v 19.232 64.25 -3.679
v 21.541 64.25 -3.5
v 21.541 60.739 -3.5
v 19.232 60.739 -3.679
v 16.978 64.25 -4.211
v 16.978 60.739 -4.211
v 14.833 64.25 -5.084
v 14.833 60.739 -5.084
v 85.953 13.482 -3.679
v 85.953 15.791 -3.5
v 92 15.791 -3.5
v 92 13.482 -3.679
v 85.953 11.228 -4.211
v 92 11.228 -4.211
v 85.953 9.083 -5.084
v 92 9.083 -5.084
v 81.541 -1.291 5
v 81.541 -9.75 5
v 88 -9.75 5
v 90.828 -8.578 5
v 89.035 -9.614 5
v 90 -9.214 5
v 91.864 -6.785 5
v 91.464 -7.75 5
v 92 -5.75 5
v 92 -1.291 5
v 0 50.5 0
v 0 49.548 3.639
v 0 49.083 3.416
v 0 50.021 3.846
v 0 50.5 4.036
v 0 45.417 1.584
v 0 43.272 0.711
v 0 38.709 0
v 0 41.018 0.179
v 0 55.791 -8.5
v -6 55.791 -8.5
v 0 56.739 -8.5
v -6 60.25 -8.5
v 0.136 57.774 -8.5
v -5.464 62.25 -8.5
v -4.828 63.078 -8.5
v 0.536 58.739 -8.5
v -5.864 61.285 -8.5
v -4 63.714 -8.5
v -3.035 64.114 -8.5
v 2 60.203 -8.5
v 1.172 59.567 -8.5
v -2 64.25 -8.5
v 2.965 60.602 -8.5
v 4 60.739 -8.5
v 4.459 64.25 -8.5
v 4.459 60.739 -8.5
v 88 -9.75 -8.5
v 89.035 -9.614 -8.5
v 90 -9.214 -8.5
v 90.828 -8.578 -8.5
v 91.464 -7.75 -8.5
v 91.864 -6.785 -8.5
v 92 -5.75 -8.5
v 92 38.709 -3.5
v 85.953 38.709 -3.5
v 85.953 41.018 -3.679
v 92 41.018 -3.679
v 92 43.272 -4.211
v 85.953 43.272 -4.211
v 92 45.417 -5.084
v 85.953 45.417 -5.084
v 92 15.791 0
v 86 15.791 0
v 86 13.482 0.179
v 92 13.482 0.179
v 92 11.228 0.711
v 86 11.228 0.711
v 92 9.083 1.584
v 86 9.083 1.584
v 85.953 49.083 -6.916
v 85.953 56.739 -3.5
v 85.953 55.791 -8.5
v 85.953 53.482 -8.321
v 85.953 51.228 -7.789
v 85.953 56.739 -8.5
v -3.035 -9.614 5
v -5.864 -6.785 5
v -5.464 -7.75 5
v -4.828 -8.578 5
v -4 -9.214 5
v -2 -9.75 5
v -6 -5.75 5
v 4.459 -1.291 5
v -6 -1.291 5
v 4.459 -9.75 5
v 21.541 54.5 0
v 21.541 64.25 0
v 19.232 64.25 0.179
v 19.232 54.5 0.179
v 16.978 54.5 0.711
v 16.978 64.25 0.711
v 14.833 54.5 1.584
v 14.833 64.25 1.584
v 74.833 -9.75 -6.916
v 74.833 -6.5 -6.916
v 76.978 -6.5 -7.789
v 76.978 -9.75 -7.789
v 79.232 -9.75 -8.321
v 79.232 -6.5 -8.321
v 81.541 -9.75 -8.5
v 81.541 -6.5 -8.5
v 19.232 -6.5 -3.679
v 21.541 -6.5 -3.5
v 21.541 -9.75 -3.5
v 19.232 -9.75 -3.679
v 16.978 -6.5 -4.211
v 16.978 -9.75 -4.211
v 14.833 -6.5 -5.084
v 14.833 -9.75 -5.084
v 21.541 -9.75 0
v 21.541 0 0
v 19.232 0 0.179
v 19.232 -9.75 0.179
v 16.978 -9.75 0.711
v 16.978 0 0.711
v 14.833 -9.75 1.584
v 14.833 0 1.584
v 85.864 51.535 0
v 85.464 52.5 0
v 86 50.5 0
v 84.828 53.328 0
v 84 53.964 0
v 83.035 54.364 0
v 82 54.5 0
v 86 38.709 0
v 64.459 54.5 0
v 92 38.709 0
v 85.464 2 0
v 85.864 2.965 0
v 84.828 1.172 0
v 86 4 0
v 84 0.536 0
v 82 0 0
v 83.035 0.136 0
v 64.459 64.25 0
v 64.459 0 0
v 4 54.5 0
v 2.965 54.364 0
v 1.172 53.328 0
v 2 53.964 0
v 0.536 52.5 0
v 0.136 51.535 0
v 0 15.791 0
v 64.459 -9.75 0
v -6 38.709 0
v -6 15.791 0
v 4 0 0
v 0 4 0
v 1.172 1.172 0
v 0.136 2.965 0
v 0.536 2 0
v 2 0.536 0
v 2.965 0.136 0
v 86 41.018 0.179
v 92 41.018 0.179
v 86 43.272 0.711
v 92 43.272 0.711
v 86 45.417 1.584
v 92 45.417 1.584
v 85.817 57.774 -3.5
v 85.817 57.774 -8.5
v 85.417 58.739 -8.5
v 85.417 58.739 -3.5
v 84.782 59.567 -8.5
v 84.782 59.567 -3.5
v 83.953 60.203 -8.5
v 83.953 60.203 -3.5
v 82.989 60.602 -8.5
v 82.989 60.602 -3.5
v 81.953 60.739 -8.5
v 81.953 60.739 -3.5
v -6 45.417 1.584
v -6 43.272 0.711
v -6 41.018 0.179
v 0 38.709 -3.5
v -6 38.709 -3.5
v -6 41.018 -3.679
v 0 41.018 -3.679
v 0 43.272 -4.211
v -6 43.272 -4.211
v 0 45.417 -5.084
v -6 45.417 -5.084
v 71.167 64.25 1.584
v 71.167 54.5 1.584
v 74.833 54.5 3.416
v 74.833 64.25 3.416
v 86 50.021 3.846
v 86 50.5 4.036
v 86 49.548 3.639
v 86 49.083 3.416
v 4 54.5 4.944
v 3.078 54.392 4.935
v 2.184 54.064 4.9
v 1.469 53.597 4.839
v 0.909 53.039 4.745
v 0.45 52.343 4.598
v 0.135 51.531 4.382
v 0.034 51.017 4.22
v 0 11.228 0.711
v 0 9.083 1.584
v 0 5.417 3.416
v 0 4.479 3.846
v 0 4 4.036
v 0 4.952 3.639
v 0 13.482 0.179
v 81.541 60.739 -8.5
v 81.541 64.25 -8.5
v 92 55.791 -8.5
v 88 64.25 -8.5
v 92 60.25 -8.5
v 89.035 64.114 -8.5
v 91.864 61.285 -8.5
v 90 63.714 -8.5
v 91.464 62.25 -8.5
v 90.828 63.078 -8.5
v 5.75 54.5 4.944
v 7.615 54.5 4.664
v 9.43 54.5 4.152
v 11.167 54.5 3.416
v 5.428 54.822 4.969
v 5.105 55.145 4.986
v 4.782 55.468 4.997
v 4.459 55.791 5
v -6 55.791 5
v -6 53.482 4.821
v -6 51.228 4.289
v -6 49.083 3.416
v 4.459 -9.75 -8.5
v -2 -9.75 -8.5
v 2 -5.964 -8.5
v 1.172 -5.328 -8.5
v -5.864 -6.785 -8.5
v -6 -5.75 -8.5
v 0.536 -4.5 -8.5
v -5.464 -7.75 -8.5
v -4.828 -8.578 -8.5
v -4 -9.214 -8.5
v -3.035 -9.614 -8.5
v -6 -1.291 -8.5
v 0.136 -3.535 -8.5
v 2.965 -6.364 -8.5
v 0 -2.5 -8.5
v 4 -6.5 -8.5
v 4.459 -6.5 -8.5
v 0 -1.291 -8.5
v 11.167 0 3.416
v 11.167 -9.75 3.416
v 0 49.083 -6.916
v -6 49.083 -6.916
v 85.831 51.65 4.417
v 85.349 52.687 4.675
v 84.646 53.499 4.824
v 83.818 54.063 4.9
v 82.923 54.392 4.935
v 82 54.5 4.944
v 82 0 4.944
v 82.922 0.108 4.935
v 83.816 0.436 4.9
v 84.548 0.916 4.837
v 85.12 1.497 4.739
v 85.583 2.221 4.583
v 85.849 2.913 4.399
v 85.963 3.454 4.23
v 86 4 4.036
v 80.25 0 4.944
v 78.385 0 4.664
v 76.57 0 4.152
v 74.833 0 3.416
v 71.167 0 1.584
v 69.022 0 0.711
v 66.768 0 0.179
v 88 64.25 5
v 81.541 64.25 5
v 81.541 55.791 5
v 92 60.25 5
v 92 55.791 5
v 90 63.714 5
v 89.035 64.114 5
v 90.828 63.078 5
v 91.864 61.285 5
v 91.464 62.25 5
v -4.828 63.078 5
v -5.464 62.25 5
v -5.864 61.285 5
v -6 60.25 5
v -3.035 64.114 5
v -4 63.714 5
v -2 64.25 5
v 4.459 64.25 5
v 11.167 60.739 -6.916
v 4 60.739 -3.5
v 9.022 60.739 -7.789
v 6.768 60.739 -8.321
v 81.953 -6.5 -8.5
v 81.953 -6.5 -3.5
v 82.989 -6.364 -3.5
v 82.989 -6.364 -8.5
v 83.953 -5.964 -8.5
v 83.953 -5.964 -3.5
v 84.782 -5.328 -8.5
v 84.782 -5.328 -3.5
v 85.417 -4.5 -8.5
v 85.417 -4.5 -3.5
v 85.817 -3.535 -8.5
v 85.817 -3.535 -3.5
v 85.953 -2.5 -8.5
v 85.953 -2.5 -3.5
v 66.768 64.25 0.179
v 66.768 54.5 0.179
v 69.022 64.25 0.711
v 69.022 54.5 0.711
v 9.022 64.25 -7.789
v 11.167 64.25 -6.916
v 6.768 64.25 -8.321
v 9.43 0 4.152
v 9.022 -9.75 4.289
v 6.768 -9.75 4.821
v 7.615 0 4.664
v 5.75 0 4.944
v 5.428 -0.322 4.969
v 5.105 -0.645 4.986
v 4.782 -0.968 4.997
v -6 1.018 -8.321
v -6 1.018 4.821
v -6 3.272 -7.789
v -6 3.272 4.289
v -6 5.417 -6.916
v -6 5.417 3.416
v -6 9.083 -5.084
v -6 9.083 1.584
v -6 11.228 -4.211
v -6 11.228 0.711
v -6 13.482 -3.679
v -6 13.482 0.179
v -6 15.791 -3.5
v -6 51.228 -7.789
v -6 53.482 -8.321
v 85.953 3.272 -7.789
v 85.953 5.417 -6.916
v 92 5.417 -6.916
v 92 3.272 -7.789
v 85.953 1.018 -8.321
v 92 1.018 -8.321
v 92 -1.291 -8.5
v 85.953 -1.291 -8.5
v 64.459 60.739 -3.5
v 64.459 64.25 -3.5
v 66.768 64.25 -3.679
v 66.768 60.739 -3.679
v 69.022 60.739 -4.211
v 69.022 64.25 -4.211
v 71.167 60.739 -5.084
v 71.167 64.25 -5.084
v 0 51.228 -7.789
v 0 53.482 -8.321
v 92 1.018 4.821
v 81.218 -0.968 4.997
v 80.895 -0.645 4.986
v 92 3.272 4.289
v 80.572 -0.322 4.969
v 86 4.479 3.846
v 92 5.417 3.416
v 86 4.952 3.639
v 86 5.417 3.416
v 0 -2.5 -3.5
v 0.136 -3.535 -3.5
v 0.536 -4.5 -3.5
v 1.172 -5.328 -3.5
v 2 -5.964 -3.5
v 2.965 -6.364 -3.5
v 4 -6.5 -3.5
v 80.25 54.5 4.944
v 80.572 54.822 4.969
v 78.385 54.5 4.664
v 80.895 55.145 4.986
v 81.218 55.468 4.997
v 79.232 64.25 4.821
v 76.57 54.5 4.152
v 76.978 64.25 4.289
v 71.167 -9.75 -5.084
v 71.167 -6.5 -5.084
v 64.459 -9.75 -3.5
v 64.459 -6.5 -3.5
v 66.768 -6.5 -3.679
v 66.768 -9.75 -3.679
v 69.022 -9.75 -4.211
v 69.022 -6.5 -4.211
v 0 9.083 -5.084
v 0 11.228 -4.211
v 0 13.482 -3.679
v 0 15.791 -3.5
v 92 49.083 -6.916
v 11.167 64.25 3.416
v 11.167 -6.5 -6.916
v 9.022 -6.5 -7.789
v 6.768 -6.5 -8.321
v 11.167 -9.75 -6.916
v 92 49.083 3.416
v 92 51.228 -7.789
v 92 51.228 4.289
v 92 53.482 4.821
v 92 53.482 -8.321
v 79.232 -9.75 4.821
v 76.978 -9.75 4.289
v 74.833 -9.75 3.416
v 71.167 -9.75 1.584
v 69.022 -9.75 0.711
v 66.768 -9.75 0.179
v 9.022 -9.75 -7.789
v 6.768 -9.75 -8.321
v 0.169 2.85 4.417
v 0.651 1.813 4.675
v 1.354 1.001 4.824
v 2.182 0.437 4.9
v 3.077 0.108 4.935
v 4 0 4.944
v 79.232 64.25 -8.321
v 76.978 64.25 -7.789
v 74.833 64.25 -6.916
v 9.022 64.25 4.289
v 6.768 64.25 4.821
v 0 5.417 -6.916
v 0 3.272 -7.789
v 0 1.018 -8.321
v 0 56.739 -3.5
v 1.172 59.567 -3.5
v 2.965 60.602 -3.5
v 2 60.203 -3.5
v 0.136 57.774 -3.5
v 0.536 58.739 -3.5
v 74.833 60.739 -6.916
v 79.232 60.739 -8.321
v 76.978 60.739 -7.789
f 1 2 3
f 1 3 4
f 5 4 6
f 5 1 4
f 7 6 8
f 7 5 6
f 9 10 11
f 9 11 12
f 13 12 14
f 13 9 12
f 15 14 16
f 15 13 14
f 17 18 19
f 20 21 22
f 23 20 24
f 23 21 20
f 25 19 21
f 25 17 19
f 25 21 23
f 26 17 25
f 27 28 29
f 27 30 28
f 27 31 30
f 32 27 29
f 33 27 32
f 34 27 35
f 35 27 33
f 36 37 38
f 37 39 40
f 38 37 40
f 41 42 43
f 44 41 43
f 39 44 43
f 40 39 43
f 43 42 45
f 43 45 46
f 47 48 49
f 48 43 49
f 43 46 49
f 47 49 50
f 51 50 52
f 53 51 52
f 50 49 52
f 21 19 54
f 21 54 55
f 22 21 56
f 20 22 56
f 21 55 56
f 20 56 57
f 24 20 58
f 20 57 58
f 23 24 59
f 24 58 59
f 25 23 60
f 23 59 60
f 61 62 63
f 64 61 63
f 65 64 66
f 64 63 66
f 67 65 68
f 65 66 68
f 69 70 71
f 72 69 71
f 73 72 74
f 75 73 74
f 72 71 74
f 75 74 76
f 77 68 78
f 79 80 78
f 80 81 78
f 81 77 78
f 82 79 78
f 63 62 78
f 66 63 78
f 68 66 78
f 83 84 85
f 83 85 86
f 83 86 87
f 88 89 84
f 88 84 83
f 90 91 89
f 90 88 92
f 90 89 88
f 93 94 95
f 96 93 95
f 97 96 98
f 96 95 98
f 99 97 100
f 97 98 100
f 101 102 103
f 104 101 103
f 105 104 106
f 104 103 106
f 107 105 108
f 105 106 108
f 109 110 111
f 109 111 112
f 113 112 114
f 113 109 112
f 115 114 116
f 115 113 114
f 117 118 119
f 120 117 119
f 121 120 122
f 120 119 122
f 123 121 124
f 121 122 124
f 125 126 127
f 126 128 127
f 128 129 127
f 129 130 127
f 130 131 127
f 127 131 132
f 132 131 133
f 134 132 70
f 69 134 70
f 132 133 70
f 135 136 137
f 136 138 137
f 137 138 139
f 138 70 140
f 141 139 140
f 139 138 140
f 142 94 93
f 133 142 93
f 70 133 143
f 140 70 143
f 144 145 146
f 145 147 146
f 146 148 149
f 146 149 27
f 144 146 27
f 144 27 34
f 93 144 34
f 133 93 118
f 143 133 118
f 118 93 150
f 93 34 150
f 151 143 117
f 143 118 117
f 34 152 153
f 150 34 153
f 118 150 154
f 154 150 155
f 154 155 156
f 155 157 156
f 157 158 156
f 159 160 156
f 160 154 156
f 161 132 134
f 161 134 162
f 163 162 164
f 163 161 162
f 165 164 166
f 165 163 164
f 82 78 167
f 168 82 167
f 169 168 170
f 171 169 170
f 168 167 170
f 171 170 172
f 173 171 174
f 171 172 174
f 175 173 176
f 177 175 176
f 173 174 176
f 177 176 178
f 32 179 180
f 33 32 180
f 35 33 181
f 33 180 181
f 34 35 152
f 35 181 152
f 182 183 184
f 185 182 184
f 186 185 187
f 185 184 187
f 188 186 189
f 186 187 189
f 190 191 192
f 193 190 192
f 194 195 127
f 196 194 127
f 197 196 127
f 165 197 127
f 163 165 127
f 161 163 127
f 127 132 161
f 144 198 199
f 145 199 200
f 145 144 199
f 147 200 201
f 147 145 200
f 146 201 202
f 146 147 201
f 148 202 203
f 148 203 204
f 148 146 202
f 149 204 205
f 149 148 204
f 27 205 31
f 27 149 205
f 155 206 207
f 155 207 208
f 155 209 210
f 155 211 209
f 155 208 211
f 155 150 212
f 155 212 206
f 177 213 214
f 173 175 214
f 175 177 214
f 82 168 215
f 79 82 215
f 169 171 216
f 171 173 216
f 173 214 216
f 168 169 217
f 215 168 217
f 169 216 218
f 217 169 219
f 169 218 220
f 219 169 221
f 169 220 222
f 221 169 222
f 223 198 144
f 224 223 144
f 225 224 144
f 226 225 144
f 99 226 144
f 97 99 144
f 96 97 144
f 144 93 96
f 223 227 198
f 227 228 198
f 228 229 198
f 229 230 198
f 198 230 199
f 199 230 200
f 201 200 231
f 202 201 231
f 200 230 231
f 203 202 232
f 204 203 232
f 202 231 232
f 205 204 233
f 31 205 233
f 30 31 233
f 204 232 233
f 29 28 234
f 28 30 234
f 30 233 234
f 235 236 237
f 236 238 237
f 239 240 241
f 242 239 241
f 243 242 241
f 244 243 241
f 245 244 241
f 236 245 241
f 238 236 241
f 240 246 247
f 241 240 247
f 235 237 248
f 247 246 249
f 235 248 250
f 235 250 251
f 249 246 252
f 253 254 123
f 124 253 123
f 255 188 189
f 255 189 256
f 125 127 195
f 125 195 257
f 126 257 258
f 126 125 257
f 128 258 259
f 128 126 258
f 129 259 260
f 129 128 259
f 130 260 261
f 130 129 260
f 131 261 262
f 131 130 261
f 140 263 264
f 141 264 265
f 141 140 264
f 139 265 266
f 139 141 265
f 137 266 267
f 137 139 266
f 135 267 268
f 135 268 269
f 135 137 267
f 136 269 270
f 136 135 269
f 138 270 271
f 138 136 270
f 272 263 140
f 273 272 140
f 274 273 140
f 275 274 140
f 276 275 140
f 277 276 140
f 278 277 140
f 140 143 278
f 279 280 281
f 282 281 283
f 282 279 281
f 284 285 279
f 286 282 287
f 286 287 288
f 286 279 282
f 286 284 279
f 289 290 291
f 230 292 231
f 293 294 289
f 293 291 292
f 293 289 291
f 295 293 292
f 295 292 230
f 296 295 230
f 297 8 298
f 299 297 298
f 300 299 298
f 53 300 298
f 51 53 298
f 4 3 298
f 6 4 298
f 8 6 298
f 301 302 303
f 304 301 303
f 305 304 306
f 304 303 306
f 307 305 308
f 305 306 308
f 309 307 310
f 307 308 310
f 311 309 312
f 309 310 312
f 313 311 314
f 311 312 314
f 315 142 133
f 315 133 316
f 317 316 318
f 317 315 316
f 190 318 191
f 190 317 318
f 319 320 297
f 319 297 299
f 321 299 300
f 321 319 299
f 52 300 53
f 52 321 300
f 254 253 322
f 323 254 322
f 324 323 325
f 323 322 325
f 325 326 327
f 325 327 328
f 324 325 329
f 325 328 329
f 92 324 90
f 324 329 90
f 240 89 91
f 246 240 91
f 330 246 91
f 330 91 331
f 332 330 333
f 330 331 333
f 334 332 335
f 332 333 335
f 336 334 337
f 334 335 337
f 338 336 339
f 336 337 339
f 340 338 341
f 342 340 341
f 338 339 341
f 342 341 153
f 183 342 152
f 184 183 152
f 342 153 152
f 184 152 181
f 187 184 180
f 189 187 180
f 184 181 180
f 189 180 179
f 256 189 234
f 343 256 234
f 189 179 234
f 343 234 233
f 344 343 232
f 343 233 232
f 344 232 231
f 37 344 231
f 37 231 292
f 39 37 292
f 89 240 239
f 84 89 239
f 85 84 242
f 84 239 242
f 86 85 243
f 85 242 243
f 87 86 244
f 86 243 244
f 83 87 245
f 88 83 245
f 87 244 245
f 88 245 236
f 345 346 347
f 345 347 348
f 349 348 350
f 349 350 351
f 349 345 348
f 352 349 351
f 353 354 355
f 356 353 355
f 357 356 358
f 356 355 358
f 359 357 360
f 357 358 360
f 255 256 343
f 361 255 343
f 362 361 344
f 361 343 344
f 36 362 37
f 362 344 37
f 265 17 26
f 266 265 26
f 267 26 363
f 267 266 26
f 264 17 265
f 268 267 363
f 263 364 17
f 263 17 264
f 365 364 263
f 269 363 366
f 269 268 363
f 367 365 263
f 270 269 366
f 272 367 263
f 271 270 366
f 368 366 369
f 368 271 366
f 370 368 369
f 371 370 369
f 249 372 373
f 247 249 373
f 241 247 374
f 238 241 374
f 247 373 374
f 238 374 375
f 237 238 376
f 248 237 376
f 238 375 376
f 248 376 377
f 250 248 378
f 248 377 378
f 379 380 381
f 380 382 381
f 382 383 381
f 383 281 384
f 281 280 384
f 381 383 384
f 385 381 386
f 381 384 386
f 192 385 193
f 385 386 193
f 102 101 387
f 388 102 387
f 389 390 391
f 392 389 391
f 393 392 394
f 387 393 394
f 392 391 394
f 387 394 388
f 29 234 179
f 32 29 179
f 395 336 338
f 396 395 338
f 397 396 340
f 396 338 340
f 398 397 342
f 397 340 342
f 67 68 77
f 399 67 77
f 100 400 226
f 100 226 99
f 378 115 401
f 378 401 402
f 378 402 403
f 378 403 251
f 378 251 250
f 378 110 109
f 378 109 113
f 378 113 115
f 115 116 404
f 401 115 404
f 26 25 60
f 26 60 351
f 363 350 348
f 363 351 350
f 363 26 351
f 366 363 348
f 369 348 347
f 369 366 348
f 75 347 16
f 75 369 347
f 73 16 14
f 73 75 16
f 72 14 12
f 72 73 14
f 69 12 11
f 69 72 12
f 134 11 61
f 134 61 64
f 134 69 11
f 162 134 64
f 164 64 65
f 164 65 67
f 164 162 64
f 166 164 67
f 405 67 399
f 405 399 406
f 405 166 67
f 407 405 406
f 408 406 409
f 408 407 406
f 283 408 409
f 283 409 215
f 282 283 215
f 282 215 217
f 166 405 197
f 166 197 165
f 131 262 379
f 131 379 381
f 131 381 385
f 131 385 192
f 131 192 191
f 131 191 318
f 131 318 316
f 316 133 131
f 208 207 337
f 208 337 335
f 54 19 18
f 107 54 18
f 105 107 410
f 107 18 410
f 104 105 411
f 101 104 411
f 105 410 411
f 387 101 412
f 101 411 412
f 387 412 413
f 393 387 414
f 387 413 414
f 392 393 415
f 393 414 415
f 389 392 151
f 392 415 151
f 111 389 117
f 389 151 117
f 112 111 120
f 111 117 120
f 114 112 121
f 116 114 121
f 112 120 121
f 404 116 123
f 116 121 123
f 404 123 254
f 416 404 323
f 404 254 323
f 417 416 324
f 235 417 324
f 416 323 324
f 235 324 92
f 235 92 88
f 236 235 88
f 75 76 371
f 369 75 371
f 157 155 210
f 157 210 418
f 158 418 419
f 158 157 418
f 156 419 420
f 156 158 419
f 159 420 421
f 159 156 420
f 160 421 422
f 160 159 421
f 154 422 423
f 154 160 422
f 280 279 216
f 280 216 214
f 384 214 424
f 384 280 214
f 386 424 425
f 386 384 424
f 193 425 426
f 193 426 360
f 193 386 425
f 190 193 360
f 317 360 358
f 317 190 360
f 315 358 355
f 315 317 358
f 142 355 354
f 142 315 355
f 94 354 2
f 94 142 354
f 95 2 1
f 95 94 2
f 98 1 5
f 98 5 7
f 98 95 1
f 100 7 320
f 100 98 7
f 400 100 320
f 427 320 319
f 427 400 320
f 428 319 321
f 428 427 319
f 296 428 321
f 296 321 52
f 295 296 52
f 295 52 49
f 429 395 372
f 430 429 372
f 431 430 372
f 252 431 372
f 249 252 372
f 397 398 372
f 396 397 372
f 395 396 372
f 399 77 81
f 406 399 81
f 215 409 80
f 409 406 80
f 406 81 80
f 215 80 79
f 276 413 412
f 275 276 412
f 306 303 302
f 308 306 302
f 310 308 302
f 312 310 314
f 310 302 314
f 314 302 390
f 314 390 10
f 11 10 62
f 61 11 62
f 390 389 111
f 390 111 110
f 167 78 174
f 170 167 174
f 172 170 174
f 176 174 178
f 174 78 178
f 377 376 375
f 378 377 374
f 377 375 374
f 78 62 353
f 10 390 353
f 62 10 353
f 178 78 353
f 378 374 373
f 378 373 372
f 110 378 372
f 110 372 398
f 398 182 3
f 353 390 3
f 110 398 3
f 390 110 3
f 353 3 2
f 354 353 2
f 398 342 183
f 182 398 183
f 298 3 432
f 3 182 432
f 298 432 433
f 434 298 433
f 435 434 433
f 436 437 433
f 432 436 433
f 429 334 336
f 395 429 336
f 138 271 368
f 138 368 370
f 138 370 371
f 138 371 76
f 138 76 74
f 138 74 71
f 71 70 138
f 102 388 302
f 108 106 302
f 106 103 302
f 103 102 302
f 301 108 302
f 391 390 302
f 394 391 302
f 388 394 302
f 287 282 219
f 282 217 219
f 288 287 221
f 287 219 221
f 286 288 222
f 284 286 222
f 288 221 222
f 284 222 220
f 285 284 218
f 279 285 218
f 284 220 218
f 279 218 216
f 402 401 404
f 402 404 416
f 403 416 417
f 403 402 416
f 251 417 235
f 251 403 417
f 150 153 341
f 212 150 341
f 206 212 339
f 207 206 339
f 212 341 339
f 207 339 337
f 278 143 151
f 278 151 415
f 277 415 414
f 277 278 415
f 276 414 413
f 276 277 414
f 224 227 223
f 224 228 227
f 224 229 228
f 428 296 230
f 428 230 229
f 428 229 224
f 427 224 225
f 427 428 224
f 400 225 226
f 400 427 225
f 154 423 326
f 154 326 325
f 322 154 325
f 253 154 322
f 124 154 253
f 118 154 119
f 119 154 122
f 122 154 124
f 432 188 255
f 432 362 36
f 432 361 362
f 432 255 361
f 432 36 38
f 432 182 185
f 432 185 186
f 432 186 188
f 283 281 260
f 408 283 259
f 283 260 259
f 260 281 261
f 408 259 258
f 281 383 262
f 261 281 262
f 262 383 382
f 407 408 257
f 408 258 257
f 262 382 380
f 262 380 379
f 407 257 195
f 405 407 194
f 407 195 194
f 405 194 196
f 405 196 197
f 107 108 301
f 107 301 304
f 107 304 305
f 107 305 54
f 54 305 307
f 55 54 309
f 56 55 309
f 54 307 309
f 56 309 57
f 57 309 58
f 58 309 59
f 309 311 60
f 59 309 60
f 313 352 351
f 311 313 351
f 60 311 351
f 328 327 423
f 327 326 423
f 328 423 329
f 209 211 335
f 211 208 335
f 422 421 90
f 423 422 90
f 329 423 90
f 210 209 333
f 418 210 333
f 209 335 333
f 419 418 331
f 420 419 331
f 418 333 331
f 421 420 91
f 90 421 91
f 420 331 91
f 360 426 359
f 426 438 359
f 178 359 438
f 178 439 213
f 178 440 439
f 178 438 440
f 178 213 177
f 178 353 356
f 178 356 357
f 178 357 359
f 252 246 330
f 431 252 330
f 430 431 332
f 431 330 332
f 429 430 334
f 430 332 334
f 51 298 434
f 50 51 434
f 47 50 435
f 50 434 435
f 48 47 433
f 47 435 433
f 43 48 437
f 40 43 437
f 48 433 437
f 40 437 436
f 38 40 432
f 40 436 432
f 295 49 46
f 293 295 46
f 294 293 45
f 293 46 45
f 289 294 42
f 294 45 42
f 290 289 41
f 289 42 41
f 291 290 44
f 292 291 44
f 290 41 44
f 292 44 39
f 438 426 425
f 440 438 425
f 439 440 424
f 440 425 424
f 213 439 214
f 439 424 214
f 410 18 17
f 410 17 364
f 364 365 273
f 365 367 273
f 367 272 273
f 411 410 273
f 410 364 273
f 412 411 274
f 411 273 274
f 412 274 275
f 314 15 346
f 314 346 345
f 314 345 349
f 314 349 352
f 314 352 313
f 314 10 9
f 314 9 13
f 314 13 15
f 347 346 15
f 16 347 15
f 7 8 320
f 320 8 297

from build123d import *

# Parameters (mm, degrees)
F2_DEPTH      = 8.5
F2_DEPTH_BACK = 5
F3_DEPTH      = 5
F5_START      = -3.5
F5_DEPTH      = 5
F7_DEPTH      = 98.001
F9_DEPTH      = 74.001
F10_T1_DEPTH  = 6.0466451645
F10_T3_DEPTH  = 6
F10_T5_DEPTH  = 3.25
F10_T7_DEPTH  = 3.5113155246
F10_T9_DEPTH  = 6
F10_T11_DEPTH = 9.75
F10_T13_DEPTH = 9.75
F10_T15_DEPTH = 23.7050983125
F10_T17_DEPTH = 23.751743477
F10_T19_DEPTH = 21.2164138371
F10_T21_DEPTH = 20.9550983125
F10_T23_DEPTH = 24.10822467
F10_T25_DEPTH = 24.10822467
F10_T27_DEPTH = 27.4550983125
F10_T29_DEPTH = 27.4550983125


# Not quite as in the source:
# - a fillet or chamfer that OpenCascade refuses, or shapes differently, is made with other operations: its cross-section is extruded or revolved along the edge and cut away or added


with BuildPart() as f2:
    # F1 (on Top) → F2 (new body, two sides)
    with BuildSketch(Plane.XY) as f2_sk:
        with BuildLine():
            ThreePointArc((-6, -5.75), (-4.8284271247, -8.5784271247), (-2, -9.75))
            Line((-2, -9.75), (88, -9.75))
            ThreePointArc((88, -9.75), (90.8284271247, -8.5784271247), (92, -5.75))
            Line((92, -5.75), (92, 60.25))
            ThreePointArc((92, 60.25), (90.8284271247, 63.0784271247), (88, 64.25))
            Line((88, 64.25), (-2, 64.25))
            ThreePointArc((-2, 64.25), (-4.8284271247, 63.0784271247), (-6, 60.25))
            Line((-6, 60.25), (-6, -5.75))
        make_face()
    extrude(amount=-F2_DEPTH)
    extrude(f2_sk.sketch, amount=F2_DEPTH_BACK)

    # F0 (on Top) → F3 (cut)
    with BuildSketch(Plane.XY):
        with BuildLine():
            ThreePointArc((0, 4), (1.1715728753, 1.1715728753), (4, 0))
            Line((4, 0), (82, 0))
            ThreePointArc((82, 0), (84.8284271247, 1.1715728753), (86, 4))
            Line((86, 4), (86, 50.5))
            ThreePointArc((86, 50.5), (84.8284271247, 53.3284271247), (82, 54.5))
            Line((82, 54.5), (4, 54.5))
            ThreePointArc((4, 54.5), (1.1715728753, 53.3284271247), (0, 50.5))
            Line((0, 50.5), (0, 4))
        make_face()
    extrude(amount=F3_DEPTH, mode=Mode.SUBTRACT)

    # F4 (on Top) → F5 (cut)
    with BuildSketch(Plane.XY.offset(F5_START)):
        with BuildLine():
            ThreePointArc((0, -2.5), (1.1715728753, -5.3284271247), (4, -6.5))
            Line((4, -6.5), (81.9533548355, -6.5))
            ThreePointArc((81.9533548355, -6.5), (84.7817819603, -5.3284271247), (85.9533548355, -2.5))
            Line((85.9533548355, -2.5), (85.9533548355, 56.7386844754))
            ThreePointArc((85.9533548355, 56.7386844754), (84.7817819603, 59.5671116002), (81.9533548355, 60.7386844754))
            Line((81.9533548355, 60.7386844754), (4, 60.7386844754))
            ThreePointArc((4, 60.7386844754), (1.1715728753, 59.5671116002), (0, 56.7386844754))
            Line((0, 56.7386844754), (0, -2.5))
        make_face()
    extrude(amount=-F5_DEPTH, mode=Mode.SUBTRACT)

    # F6 (on face) → F7 (cut, through all)
    with BuildSketch(Plane(origin=(-6, 0, 0), x_dir=(0, -1, 0), z_dir=(-1, 0, 0))):
        Polygon((-27.25, -8.5), (-2.25, -8.5), (-12.25, -3.5), (-27.25, -3.5), (-42.25, -3.5), (-52.25, -8.5), align=None)
        Polygon((-12.25, 0), (-2.25, 5), (-27.25, 5), (-52.25, 5), (-42.25, 0), (-27.25, 0), align=None)
    extrude(amount=-F7_DEPTH, mode=Mode.SUBTRACT)

    # F8 (on face) → F9 (cut, through all)
    with BuildSketch(Plane.XZ.offset(9.75)):
        Polygon((18, -3.5), (8, -8.5), (78, -8.5), (68, -3.5), (43, -3.5), align=None)
        Polygon((78, 5), (8, 5), (18, 0), (43, 0), (68, 0), align=None)
    extrude(amount=-F9_DEPTH, mode=Mode.SUBTRACT)

    # F10: fillet of radius 15 on 32 edges, made by hand

    # F10_s2 → F10_t1 (join)
    with BuildSketch(Plane.YZ.offset(85.9533548355)):
        with BuildLine():
            ThreePointArc((38.7089803375, -3.5), (42.1552741457, -3.901265158), (45.41718427, -5.083592135))
            Line((45.41718427, -5.083592135), (42.25, -3.5))
            Line((42.25, -3.5), (38.7089803375, -3.5))
        make_face()
        with BuildLine():
            ThreePointArc((15.7910196625, -3.5), (12.3447258543, -3.901265158), (9.08281573, -5.083592135))
            Line((9.08281573, -5.083592135), (12.25, -3.5))
            Line((12.25, -3.5), (15.7910196625, -3.5))
        make_face()
    extrude(amount=F10_T1_DEPTH)

    # F10_s4 → F10_t3 (join)
    with BuildSketch(Plane.YZ.offset(-6)):
        with BuildLine():
            ThreePointArc((38.7089803375, -3.5), (42.1552741457, -3.901265158), (45.41718427, -5.083592135))
            Line((45.41718427, -5.083592135), (42.25, -3.5))
            Line((42.25, -3.5), (38.7089803375, -3.5))
        make_face()
        with BuildLine():
            ThreePointArc((9.08281573, -5.083592135), (12.3447258543, -3.901265158), (15.7910196625, -3.5))
            Line((15.7910196625, -3.5), (12.25, -3.5))
            Line((12.25, -3.5), (9.08281573, -5.083592135))
        make_face()
        with BuildLine():
            ThreePointArc((15.7910196625, 0), (12.3447258543, 0.401265158), (9.08281573, 1.583592135))
            Line((9.08281573, 1.583592135), (12.25, 0))
            Line((12.25, 0), (15.7910196625, 0))
        make_face()
        with BuildLine():
            ThreePointArc((45.41718427, 1.583592135), (42.1552741457, 0.401265158), (38.7089803375, 0))
            Line((38.7089803375, 0), (42.25, 0))
            Line((42.25, 0), (45.41718427, 1.583592135))
        make_face()
    extrude(amount=F10_T3_DEPTH)

    # F10_s6 → F10_t5 (join)
    with BuildSketch(Plane.XZ.offset(6.5)):
        with BuildLine():
            ThreePointArc((64.4589803375, -3.5), (67.9052741457, -3.901265158), (71.16718427, -5.083592135))
            Line((71.16718427, -5.083592135), (68, -3.5))
            Line((68, -3.5), (64.4589803375, -3.5))
        make_face()
        with BuildLine():
            ThreePointArc((21.5410196625, -3.5), (18.0947258543, -3.901265158), (14.83281573, -5.083592135))
            Line((14.83281573, -5.083592135), (18, -3.5))
            Line((18, -3.5), (21.5410196625, -3.5))
        make_face()
    extrude(amount=F10_T5_DEPTH)

    # F10_s8 → F10_t7 (join)
    with BuildSketch(Plane.XZ.offset(-64.25)):
        with BuildLine():
            ThreePointArc((64.4589803375, -3.5), (67.9052741457, -3.901265158), (71.16718427, -5.083592135))
            Line((71.16718427, -5.083592135), (68, -3.5))
            Line((68, -3.5), (64.4589803375, -3.5))
        make_face()
        with BuildLine():
            ThreePointArc((21.5410196625, -3.5), (18.0947258543, -3.901265158), (14.83281573, -5.083592135))
            Line((14.83281573, -5.083592135), (18, -3.5))
            Line((18, -3.5), (21.5410196625, -3.5))
        make_face()
    extrude(amount=F10_T7_DEPTH)

    # F10_s10 → F10_t9 (join)
    with BuildSketch(Plane.YZ.offset(86)):
        with BuildLine():
            ThreePointArc((15.7910196625, 0), (12.3447258543, 0.401265158), (9.08281573, 1.583592135))
            Line((9.08281573, 1.583592135), (12.25, 0))
            Line((12.25, 0), (15.7910196625, 0))
        make_face()
        with BuildLine():
            ThreePointArc((38.7089803375, 0), (42.1552741457, 0.401265158), (45.41718427, 1.583592135))
            Line((45.41718427, 1.583592135), (42.25, 0))
            Line((42.25, 0), (38.7089803375, 0))
        make_face()
    extrude(amount=F10_T9_DEPTH)

    # F10_s12 → F10_t11 (join)
    with BuildSketch(Plane.XZ.offset(-64.25)):
        with BuildLine():
            ThreePointArc((64.4589803375, 0), (67.9052741457, 0.401265158), (71.16718427, 1.583592135))
            Line((71.16718427, 1.583592135), (68, 0))
            Line((68, 0), (64.4589803375, 0))
        make_face()
        with BuildLine():
            ThreePointArc((21.5410196625, 0), (18.0947258543, 0.401265158), (14.83281573, 1.583592135))
            Line((14.83281573, 1.583592135), (18, 0))
            Line((18, 0), (21.5410196625, 0))
        make_face()
    extrude(amount=F10_T11_DEPTH)

    # F10_s14 → F10_t13 (join)
    with BuildSketch(Plane.XZ):
        with BuildLine():
            ThreePointArc((64.4589803375, 0), (67.9052741457, 0.401265158), (71.16718427, 1.583592135))
            Line((71.16718427, 1.583592135), (68, 0))
            Line((68, 0), (64.4589803375, 0))
        make_face()
        with BuildLine():
            ThreePointArc((21.5410196625, 0), (18.0947258543, 0.401265158), (14.83281573, 1.583592135))
            Line((14.83281573, 1.583592135), (18, 0))
            Line((18, 0), (21.5410196625, 0))
        make_face()
    extrude(amount=F10_T13_DEPTH)

    # F10_s16 → F10_t15 (cut)
    with BuildSketch(Plane.YZ.offset(-14.8525491562)):
        with BuildLine():
            ThreePointArc((-1.2910196625, -8.5), (2.1552741457, -8.098734842), (5.41718427, -6.916407865))
            Line((5.41718427, -6.916407865), (2.25, -8.5))
            Line((2.25, -8.5), (-1.2910196625, -8.5))
        make_face()
        with BuildLine():
            ThreePointArc((49.08281573, -6.916407865), (52.3447258543, -8.098734842), (55.7910196625, -8.5))
            Line((55.7910196625, -8.5), (52.25, -8.5))
            Line((52.25, -8.5), (49.08281573, -6.916407865))
        make_face()
    extrude(amount=F10_T15_DEPTH, mode=Mode.SUBTRACT)

    # F10_s18 → F10_t17 (cut)
    with BuildSketch(Plane.YZ.offset(77.1008056793)):
        with BuildLine():
            ThreePointArc((5.41718427, -6.916407865), (2.1552741457, -8.098734842), (-1.2910196625, -8.5))
            Line((-1.2910196625, -8.5), (2.25, -8.5))
            Line((2.25, -8.5), (5.41718427, -6.916407865))
        make_face()
        with BuildLine():
            ThreePointArc((49.08281573, -6.916407865), (52.3447258543, -8.098734842), (55.7910196625, -8.5))
            Line((55.7910196625, -8.5), (52.25, -8.5))
            Line((52.25, -8.5), (49.08281573, -6.916407865))
        make_face()
    extrude(amount=F10_T17_DEPTH, mode=Mode.SUBTRACT)

    # F10_s20 → F10_t19 (cut)
    with BuildSketch(Plane.XZ.offset(-73.1025491562)):
        with BuildLine():
            ThreePointArc((74.83281573, -6.916407865), (78.0947258543, -8.098734842), (81.5410196625, -8.5))
            Line((81.5410196625, -8.5), (78, -8.5))
            Line((78, -8.5), (74.83281573, -6.916407865))
        make_face()
        with BuildLine():
            ThreePointArc((11.16718427, -6.916407865), (7.9052741457, -8.098734842), (4.4589803375, -8.5))
            Line((4.4589803375, -8.5), (8, -8.5))
            Line((8, -8.5), (11.16718427, -6.916407865))
        make_face()
    extrude(amount=F10_T19_DEPTH, mode=Mode.SUBTRACT)

    # F10_s22 → F10_t21 (cut)
    with BuildSketch(Plane.XZ.offset(-2.3525491562)):
        with BuildLine():
            ThreePointArc((74.83281573, -6.916407865), (78.0947258543, -8.098734842), (81.5410196625, -8.5))
            Line((81.5410196625, -8.5), (78, -8.5))
            Line((78, -8.5), (74.83281573, -6.916407865))
        make_face()
        with BuildLine():
            ThreePointArc((11.16718427, -6.916407865), (7.9052741457, -8.098734842), (4.4589803375, -8.5))
            Line((4.4589803375, -8.5), (8, -8.5))
            Line((8, -8.5), (11.16718427, -6.916407865))
        make_face()
    extrude(amount=F10_T21_DEPTH, mode=Mode.SUBTRACT)

    # F10_s24 → F10_t23 (cut)
    with BuildSketch(Plane.YZ.offset(-14.8525491562)):
        with BuildLine():
            ThreePointArc((5.41718427, 3.416407865), (2.1552741457, 4.598734842), (-1.2910196625, 5))
            Line((-1.2910196625, 5), (2.25, 5))
            Line((2.25, 5), (5.41718427, 3.416407865))
        make_face()
        with BuildLine():
            ThreePointArc((55.7910196625, 5), (52.3447258543, 4.598734842), (49.08281573, 3.416407865))
            Line((49.08281573, 3.416407865), (52.25, 5))
            Line((52.25, 5), (55.7910196625, 5))
        make_face()
    extrude(amount=F10_T23_DEPTH, mode=Mode.SUBTRACT)

    # F10_s26 → F10_t25 (cut)
    with BuildSketch(Plane.YZ.offset(76.7443244862)):
        with BuildLine():
            ThreePointArc((-1.2910196625, 5), (2.1552741457, 4.598734842), (5.41718427, 3.416407865))
            Line((5.41718427, 3.416407865), (2.25, 5))
            Line((2.25, 5), (-1.2910196625, 5))
        make_face()
        with BuildLine():
            ThreePointArc((55.7910196625, 5), (52.3447258543, 4.598734842), (49.08281573, 3.416407865))
            Line((49.08281573, 3.416407865), (52.25, 5))
            Line((52.25, 5), (55.7910196625, 5))
        make_face()
    extrude(amount=F10_T25_DEPTH, mode=Mode.SUBTRACT)

    # F10_s28 → F10_t27 (cut)
    with BuildSketch(Plane.XZ.offset(-73.1025491562)):
        with BuildLine():
            ThreePointArc((81.5410196625, 5), (78.0947258543, 4.598734842), (74.83281573, 3.416407865))
            Line((74.83281573, 3.416407865), (78, 5))
            Line((78, 5), (81.5410196625, 5))
        make_face()
        with BuildLine():
            ThreePointArc((4.4589803375, 5), (7.9052741457, 4.598734842), (11.16718427, 3.416407865))
            Line((11.16718427, 3.416407865), (8, 5))
            Line((8, 5), (4.4589803375, 5))
        make_face()
    extrude(amount=F10_T27_DEPTH, mode=Mode.SUBTRACT)

    # F10_s30 → F10_t29 (cut)
    with BuildSketch(Plane.XZ.offset(-8.8525491562)):
        with BuildLine():
            ThreePointArc((81.5410196625, 5), (78.0947258543, 4.598734842), (74.83281573, 3.416407865))
            Line((74.83281573, 3.416407865), (78, 5))
            Line((78, 5), (81.5410196625, 5))
        make_face()
        with BuildLine():
            ThreePointArc((11.16718427, 3.416407865), (7.9052741457, 4.598734842), (4.4589803375, 5))
            Line((4.4589803375, 5), (8, 5))
            Line((8, 5), (11.16718427, 3.416407865))
        make_face()
    extrude(amount=F10_T29_DEPTH, mode=Mode.SUBTRACT)


solid = f2.part
